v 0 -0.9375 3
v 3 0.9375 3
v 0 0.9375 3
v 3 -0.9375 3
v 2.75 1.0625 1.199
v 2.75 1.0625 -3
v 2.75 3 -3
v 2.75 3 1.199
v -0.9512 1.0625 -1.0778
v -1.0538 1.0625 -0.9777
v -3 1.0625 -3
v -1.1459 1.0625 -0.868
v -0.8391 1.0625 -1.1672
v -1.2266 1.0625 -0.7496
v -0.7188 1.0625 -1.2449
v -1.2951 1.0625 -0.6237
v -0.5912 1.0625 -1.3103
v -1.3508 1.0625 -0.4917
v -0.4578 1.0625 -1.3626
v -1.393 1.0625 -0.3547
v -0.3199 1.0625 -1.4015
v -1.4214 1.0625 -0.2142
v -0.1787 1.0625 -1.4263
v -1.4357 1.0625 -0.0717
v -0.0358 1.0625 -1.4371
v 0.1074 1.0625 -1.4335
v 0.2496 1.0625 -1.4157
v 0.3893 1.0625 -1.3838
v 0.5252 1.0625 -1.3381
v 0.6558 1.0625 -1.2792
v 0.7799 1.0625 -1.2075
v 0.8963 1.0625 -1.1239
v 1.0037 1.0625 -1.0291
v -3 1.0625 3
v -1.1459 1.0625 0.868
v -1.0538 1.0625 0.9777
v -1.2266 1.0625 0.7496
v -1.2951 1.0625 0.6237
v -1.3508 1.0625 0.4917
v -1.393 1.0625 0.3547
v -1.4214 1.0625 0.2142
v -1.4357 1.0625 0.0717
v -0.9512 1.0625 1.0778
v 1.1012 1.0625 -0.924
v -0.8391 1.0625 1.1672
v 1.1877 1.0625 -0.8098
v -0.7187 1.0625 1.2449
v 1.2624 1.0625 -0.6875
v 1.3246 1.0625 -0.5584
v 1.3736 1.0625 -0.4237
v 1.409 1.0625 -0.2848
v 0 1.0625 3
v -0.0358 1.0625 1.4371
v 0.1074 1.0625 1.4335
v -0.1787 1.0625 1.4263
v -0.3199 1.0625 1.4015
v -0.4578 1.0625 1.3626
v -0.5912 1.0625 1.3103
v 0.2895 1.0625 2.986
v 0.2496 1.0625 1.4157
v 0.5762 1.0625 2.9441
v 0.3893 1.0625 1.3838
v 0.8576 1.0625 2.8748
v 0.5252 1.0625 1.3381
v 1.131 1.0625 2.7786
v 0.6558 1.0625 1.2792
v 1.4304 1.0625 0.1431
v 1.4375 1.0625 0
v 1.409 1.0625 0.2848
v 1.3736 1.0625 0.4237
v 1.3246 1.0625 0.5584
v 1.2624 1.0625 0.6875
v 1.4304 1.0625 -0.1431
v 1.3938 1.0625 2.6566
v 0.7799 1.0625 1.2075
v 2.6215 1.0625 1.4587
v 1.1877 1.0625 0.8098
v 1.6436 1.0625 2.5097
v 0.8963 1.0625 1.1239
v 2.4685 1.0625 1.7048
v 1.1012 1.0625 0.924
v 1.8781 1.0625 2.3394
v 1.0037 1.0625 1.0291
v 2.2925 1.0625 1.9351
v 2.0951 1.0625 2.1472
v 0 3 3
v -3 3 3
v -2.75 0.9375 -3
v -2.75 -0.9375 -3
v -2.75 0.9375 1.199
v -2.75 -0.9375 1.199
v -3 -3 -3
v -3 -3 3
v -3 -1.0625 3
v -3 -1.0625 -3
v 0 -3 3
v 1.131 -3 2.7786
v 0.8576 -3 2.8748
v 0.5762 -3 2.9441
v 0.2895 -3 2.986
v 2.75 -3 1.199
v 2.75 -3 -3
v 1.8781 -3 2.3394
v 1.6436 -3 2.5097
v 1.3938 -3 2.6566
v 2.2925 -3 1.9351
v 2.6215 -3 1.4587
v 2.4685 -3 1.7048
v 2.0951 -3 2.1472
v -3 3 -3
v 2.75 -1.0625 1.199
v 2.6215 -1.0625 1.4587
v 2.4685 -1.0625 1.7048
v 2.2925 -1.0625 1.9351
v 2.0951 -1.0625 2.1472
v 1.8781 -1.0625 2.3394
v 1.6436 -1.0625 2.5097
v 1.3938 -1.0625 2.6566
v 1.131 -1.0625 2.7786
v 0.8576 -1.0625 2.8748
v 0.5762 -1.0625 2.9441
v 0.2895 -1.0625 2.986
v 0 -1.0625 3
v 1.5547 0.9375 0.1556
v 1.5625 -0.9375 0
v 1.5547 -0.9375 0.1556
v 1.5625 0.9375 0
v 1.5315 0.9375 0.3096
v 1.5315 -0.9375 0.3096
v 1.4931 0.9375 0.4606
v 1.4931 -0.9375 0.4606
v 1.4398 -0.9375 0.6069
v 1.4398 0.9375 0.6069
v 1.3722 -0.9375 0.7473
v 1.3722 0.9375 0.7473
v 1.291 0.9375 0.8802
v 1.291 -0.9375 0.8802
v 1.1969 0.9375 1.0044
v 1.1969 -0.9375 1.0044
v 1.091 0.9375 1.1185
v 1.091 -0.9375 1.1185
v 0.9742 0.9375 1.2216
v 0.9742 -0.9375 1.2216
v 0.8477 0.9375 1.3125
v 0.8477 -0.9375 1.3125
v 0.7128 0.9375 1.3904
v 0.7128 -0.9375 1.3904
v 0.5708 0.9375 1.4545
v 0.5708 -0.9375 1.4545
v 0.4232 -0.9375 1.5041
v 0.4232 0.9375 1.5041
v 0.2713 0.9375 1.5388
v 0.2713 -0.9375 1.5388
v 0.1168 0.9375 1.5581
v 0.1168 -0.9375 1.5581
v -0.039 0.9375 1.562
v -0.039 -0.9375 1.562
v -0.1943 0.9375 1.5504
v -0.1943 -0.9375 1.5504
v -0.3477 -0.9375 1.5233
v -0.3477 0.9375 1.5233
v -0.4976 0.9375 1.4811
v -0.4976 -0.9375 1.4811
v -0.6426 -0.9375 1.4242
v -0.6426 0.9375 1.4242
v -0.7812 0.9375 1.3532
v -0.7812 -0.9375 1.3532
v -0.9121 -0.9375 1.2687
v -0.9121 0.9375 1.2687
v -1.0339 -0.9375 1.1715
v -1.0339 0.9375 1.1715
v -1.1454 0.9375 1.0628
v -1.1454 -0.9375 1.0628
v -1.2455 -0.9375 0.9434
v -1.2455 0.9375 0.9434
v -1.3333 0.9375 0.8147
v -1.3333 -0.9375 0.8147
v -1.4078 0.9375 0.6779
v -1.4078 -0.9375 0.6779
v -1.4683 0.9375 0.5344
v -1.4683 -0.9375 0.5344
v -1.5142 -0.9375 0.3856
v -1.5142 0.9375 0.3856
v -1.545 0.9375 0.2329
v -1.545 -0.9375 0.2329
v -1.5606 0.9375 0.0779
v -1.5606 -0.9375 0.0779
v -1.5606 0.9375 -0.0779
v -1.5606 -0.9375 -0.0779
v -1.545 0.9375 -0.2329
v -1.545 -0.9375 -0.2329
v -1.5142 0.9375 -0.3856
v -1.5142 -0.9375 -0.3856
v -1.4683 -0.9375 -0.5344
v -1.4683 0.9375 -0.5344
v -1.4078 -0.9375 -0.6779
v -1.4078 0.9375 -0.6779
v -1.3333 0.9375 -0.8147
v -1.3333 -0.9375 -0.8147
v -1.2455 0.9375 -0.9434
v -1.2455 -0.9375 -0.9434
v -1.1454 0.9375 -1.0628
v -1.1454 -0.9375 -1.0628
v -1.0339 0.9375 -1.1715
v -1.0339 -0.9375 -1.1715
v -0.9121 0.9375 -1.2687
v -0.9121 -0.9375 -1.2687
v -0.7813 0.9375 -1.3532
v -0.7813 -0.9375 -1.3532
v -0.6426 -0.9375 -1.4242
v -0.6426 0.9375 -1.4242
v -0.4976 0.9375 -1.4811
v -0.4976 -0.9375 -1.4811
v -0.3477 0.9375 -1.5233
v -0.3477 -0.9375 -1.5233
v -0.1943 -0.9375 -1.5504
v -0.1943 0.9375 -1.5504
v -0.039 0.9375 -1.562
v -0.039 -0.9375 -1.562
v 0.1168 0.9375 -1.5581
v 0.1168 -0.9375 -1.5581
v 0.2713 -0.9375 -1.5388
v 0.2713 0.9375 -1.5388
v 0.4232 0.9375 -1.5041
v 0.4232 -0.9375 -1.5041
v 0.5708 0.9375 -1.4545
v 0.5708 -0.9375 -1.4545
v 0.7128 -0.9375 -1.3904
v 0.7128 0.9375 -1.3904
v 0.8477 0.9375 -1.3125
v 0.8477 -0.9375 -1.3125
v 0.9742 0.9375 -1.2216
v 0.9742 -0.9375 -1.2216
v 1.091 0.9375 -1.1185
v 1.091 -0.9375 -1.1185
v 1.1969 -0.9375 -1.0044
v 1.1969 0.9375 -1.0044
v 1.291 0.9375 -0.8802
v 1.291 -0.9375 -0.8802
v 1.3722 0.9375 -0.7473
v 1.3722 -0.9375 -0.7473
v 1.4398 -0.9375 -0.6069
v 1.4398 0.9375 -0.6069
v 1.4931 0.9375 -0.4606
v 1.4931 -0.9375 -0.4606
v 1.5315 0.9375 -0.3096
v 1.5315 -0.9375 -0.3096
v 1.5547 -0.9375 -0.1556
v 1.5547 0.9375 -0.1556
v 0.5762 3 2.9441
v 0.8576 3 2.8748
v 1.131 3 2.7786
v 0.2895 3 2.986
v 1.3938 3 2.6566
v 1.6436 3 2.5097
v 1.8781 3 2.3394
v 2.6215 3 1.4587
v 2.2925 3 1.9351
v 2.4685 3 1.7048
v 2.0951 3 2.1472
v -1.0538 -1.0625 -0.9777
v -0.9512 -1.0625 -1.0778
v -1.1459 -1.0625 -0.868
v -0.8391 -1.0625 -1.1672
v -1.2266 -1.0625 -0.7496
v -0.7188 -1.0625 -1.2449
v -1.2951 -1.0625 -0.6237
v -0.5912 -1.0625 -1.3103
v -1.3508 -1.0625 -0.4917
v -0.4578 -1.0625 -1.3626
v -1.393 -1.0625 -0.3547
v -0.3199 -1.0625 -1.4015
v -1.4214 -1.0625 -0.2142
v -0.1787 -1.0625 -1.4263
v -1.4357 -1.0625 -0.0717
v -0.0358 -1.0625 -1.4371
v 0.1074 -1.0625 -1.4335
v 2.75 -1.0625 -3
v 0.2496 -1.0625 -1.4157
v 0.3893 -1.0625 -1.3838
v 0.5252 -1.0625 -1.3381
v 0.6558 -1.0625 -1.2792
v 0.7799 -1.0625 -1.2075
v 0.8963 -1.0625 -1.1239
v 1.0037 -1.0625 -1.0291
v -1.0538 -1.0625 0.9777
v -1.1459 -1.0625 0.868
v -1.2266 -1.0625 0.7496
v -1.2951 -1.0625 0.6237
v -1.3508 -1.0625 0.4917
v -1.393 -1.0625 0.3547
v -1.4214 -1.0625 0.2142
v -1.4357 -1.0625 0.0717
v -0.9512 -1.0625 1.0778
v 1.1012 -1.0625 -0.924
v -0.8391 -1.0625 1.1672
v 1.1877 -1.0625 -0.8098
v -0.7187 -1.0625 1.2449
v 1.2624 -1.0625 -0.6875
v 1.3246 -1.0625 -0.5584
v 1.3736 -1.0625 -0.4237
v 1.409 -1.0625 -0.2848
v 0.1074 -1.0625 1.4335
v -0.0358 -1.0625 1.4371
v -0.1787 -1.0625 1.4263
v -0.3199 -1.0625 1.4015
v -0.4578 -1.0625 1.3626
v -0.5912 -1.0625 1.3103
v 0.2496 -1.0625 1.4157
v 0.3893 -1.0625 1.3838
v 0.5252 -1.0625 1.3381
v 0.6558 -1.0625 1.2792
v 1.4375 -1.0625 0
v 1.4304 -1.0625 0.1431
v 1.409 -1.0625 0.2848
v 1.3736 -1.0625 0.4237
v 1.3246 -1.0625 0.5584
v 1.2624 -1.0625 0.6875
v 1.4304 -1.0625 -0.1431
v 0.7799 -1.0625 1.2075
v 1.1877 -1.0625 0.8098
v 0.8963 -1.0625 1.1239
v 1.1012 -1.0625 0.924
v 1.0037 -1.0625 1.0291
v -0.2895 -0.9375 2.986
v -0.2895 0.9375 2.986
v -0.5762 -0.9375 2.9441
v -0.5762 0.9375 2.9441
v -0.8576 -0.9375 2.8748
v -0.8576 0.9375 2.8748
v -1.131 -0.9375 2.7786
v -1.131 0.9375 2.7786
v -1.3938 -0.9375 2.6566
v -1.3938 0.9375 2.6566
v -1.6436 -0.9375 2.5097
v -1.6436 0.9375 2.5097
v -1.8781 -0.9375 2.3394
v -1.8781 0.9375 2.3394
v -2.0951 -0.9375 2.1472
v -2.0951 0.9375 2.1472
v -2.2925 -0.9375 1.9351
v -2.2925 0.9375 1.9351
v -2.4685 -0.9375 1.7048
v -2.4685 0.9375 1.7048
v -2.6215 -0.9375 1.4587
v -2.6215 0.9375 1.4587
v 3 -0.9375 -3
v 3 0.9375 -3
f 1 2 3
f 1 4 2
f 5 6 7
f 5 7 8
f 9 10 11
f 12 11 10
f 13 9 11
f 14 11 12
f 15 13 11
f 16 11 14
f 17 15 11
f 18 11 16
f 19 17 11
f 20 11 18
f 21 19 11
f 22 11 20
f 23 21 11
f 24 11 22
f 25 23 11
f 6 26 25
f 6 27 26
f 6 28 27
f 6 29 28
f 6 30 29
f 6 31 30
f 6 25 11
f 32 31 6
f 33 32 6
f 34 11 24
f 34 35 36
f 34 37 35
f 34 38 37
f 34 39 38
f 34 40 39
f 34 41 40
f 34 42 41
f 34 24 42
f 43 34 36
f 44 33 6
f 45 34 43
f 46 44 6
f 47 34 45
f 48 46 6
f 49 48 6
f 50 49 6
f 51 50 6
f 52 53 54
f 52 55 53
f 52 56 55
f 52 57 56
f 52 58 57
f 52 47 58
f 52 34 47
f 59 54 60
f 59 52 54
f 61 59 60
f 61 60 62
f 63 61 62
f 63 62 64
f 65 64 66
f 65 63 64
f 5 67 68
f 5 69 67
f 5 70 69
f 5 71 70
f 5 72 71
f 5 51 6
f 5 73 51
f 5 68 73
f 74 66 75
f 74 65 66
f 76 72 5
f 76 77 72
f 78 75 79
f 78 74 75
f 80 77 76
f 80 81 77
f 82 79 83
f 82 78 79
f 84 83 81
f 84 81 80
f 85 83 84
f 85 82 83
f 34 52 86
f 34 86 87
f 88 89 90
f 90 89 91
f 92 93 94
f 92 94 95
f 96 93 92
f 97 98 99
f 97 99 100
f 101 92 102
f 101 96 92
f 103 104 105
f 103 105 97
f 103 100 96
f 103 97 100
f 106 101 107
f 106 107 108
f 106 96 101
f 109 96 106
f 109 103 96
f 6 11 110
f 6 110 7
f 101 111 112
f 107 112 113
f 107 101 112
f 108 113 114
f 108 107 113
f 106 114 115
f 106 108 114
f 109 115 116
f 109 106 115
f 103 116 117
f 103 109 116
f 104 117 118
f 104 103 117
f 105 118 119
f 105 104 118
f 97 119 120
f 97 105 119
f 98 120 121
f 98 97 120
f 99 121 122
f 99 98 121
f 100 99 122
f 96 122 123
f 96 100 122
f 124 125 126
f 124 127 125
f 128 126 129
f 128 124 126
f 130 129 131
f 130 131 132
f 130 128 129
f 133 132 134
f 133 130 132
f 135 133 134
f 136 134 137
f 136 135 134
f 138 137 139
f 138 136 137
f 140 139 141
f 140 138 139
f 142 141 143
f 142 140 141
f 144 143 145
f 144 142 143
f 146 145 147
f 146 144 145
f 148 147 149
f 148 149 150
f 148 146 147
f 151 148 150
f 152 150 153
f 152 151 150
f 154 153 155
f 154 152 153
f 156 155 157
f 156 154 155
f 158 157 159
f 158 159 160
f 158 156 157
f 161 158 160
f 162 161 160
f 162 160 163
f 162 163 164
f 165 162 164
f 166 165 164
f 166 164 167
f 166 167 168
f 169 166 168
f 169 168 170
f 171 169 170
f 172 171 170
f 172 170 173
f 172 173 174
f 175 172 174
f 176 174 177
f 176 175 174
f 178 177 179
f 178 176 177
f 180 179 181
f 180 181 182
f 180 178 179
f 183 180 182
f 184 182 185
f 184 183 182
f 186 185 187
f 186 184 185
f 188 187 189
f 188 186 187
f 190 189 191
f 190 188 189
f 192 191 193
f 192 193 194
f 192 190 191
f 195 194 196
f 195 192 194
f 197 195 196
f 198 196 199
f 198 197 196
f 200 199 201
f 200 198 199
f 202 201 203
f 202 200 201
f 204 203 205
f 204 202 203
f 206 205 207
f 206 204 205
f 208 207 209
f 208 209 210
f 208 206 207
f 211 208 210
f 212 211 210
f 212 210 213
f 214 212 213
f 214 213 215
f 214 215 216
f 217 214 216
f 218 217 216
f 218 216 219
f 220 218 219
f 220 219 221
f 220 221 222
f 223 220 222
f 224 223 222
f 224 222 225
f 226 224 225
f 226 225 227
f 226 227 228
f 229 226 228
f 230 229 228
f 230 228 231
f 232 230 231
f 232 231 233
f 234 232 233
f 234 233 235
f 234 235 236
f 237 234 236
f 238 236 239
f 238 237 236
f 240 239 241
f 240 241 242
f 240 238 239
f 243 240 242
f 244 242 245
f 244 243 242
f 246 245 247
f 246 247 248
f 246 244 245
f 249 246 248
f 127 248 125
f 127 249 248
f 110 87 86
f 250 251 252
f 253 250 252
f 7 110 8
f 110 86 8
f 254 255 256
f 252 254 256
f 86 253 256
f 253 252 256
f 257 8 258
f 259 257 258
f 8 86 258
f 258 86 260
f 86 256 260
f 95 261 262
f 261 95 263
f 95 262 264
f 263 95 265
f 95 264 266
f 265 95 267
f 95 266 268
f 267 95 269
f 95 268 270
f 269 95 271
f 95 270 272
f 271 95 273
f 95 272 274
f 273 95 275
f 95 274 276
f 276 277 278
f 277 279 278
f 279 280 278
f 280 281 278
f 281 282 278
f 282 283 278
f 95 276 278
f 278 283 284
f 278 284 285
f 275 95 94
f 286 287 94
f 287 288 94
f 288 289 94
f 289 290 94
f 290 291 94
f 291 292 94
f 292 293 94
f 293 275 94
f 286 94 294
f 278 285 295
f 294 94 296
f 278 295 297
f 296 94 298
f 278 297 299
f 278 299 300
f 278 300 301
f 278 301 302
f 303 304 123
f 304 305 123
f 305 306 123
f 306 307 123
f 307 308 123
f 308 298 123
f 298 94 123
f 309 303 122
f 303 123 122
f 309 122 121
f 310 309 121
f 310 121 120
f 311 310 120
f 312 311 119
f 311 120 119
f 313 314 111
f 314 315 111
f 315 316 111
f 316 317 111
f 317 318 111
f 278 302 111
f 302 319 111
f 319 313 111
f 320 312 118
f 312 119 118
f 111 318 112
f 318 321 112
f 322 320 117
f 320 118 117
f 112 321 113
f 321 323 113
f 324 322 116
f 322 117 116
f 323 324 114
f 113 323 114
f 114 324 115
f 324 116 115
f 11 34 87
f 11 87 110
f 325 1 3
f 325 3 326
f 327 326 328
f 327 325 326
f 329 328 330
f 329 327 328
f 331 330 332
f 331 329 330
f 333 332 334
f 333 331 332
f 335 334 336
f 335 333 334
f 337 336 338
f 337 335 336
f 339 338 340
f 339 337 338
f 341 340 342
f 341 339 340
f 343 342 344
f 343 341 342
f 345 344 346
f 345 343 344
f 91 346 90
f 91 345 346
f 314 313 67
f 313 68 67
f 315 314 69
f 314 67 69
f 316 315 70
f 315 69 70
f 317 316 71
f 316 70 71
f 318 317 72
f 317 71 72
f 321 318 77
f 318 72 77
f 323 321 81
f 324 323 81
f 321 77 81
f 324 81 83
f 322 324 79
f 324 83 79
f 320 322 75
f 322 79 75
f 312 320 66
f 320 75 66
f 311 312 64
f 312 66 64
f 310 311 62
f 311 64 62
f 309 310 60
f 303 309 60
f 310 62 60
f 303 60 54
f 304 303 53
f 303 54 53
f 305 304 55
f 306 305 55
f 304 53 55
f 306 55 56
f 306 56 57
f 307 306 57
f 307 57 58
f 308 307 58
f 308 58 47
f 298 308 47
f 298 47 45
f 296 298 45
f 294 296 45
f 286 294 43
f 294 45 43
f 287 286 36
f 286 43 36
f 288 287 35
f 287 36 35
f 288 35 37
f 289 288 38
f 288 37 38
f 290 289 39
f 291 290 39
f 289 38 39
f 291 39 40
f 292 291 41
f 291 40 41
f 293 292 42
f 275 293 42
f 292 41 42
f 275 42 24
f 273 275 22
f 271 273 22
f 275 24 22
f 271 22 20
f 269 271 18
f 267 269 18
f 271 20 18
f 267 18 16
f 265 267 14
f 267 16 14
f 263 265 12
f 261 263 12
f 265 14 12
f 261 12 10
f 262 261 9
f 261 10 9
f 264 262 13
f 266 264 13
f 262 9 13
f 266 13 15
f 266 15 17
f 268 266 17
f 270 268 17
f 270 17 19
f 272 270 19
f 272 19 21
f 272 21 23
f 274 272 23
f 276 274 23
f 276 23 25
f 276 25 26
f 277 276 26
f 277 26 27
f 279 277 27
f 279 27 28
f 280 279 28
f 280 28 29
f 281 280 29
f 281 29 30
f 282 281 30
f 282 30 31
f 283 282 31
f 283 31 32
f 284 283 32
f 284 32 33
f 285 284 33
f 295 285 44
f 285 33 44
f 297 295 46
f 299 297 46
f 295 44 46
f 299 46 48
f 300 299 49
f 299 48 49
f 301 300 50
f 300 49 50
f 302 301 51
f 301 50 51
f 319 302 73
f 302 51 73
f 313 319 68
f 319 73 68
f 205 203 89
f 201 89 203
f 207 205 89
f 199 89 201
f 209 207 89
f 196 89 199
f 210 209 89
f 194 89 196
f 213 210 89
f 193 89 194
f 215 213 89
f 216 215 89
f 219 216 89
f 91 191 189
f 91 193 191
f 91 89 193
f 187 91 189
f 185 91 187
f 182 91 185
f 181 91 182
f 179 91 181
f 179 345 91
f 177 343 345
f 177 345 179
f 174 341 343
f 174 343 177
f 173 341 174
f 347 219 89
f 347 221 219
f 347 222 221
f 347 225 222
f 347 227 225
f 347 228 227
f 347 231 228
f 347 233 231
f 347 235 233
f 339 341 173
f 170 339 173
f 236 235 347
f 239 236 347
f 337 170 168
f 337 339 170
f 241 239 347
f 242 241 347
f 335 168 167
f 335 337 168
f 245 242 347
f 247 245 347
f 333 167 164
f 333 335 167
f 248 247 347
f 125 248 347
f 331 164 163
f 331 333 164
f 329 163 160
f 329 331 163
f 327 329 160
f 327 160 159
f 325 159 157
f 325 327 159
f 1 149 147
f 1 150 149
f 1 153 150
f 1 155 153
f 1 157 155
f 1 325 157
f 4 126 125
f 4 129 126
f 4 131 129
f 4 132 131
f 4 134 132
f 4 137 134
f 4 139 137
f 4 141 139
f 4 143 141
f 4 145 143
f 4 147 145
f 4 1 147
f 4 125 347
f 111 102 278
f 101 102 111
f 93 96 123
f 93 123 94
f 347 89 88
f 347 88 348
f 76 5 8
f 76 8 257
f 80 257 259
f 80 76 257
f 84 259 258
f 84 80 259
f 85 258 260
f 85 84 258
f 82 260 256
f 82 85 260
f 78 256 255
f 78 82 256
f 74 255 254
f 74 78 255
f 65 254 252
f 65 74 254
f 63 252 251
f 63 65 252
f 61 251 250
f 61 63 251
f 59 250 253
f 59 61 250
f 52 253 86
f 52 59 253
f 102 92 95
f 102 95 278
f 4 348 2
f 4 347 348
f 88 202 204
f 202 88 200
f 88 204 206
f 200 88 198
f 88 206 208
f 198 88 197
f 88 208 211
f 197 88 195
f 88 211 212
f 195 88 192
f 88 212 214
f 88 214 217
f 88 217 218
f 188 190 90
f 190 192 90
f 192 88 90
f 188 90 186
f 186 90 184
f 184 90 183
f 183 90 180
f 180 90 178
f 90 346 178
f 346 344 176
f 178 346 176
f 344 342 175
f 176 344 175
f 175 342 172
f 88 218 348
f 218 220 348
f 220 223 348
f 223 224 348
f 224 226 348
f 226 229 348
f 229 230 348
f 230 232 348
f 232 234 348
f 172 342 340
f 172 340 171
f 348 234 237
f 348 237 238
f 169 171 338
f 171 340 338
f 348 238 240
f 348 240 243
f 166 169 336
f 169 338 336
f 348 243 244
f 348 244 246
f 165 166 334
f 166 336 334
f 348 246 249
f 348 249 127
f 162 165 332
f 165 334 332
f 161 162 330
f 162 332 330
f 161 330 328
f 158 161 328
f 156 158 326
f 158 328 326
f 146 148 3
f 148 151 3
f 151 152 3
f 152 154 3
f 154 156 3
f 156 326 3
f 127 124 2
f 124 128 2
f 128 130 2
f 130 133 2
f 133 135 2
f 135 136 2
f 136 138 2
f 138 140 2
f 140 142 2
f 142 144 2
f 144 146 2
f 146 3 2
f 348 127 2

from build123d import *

# Parameters (mm, degrees)
F2_R     = 1.5625
F2_R_2   = 1.4375
F3_DEPTH = 3
F4_DEPTH = 1.0625
F5_DEPTH = 0.9375
F6_W     = 0.25
F6_H     = 6
F7_DEPTH = 12.5
F8_DEPTH = 3


with BuildPart() as f3:
    # F2 (on Front) → F3 (new body, symmetric)
    with BuildSketch(Plane.XZ):
        with BuildLine():
            ThreePointArc((0, -3), (2.1213203436, -2.1213203436), (3, 0))
            ThreePointArc((3, 0), (2.1213203436, 2.1213203436), (0, 3))
            ThreePointArc((0, 3), (-2.1213203436, 2.1213203436), (-3, 0))
            ThreePointArc((-3, 0), (-2.1213203436, -2.1213203436), (0, -3))
        make_face()
        Circle(F2_R, mode=Mode.SUBTRACT)
        Circle(F2_R)
        Circle(F2_R_2, mode=Mode.SUBTRACT)
        Circle(F2_R_2)
        with BuildLine():
            Line((3, -3), (3, 0))
            ThreePointArc((3, 0), (2.1213203436, -2.1213203436), (0, -3))
            Line((0, -3), (3, -3))
        make_face()
        with BuildLine():
            Line((-3, -3), (0, -3))
            ThreePointArc((0, -3), (-2.1213203436, -2.1213203436), (-3, 0))
            Line((-3, 0), (-3, -3))
        make_face()
        with BuildLine():
            ThreePointArc((-3, 0), (-2.1213203436, 2.1213203436), (0, 3))
            Line((0, 3), (-3, 3))
            Line((-3, 3), (-3, 0))
        make_face()
    extrude(amount=F3_DEPTH, both=True)

    # F2 (on Front) → F4 (cut, symmetric)
    with BuildSketch(Plane.XZ):
        with BuildLine():
            ThreePointArc((0, -3), (2.1213203436, -2.1213203436), (3, 0))
            ThreePointArc((3, 0), (2.1213203436, 2.1213203436), (0, 3))
            ThreePointArc((0, 3), (-2.1213203436, 2.1213203436), (-3, 0))
            ThreePointArc((-3, 0), (-2.1213203436, -2.1213203436), (0, -3))
        make_face()
        Circle(F2_R, mode=Mode.SUBTRACT)
        Circle(F2_R)
        Circle(F2_R_2, mode=Mode.SUBTRACT)
        with BuildLine():
            Line((3, -3), (3, 0))
            ThreePointArc((3, 0), (2.1213203436, -2.1213203436), (0, -3))
            Line((0, -3), (3, -3))
        make_face()
        with BuildLine():
            Line((-3, -3), (0, -3))
            ThreePointArc((0, -3), (-2.1213203436, -2.1213203436), (-3, 0))
            Line((-3, 0), (-3, -3))
        make_face()
        with BuildLine():
            ThreePointArc((-3, 0), (-2.1213203436, 2.1213203436), (0, 3))
            Line((0, 3), (-3, 3))
            Line((-3, 3), (-3, 0))
        make_face()
    extrude(amount=F4_DEPTH, both=True, mode=Mode.SUBTRACT)

    # F6 (on Front) → F8 (cut, symmetric)
    with BuildSketch(Plane.XZ):
        with Locations((2.875, 0)):
            Rectangle(F6_W, F6_H)
    extrude(amount=F8_DEPTH, both=True, mode=Mode.SUBTRACT)


with BuildPart() as f5:
    # F2 (on Front) → F5 (new body, symmetric)
    with BuildSketch(Plane.XZ):
        with BuildLine():
            ThreePointArc((0, -3), (2.1213203436, -2.1213203436), (3, 0))
            ThreePointArc((3, 0), (2.1213203436, 2.1213203436), (0, 3))
            ThreePointArc((0, 3), (-2.1213203436, 2.1213203436), (-3, 0))
            ThreePointArc((-3, 0), (-2.1213203436, -2.1213203436), (0, -3))
        make_face()
        Circle(F2_R, mode=Mode.SUBTRACT)
        with BuildLine():
            Line((-3, -3), (0, -3))
            ThreePointArc((0, -3), (-2.1213203436, -2.1213203436), (-3, 0))
            Line((-3, 0), (-3, -3))
        make_face()
        with BuildLine():
            Line((3, -3), (3, 0))
            ThreePointArc((3, 0), (2.1213203436, -2.1213203436), (0, -3))
            Line((0, -3), (3, -3))
        make_face()
        with BuildLine():
            ThreePointArc((0, 3), (2.1213203436, 2.1213203436), (3, 0))
            Line((3, 0), (3, 3))
            Line((3, 3), (0, 3))
        make_face()
    extrude(amount=F5_DEPTH, both=True)

    # F6 (on Front) → F7 (cut, symmetric)
    with BuildSketch(Plane.XZ):
        with Locations((-2.875, 0)):
            Rectangle(F6_W, F6_H)
    extrude(amount=F7_DEPTH, both=True, mode=Mode.SUBTRACT)


solid = Compound([f3.part, f5.part])
